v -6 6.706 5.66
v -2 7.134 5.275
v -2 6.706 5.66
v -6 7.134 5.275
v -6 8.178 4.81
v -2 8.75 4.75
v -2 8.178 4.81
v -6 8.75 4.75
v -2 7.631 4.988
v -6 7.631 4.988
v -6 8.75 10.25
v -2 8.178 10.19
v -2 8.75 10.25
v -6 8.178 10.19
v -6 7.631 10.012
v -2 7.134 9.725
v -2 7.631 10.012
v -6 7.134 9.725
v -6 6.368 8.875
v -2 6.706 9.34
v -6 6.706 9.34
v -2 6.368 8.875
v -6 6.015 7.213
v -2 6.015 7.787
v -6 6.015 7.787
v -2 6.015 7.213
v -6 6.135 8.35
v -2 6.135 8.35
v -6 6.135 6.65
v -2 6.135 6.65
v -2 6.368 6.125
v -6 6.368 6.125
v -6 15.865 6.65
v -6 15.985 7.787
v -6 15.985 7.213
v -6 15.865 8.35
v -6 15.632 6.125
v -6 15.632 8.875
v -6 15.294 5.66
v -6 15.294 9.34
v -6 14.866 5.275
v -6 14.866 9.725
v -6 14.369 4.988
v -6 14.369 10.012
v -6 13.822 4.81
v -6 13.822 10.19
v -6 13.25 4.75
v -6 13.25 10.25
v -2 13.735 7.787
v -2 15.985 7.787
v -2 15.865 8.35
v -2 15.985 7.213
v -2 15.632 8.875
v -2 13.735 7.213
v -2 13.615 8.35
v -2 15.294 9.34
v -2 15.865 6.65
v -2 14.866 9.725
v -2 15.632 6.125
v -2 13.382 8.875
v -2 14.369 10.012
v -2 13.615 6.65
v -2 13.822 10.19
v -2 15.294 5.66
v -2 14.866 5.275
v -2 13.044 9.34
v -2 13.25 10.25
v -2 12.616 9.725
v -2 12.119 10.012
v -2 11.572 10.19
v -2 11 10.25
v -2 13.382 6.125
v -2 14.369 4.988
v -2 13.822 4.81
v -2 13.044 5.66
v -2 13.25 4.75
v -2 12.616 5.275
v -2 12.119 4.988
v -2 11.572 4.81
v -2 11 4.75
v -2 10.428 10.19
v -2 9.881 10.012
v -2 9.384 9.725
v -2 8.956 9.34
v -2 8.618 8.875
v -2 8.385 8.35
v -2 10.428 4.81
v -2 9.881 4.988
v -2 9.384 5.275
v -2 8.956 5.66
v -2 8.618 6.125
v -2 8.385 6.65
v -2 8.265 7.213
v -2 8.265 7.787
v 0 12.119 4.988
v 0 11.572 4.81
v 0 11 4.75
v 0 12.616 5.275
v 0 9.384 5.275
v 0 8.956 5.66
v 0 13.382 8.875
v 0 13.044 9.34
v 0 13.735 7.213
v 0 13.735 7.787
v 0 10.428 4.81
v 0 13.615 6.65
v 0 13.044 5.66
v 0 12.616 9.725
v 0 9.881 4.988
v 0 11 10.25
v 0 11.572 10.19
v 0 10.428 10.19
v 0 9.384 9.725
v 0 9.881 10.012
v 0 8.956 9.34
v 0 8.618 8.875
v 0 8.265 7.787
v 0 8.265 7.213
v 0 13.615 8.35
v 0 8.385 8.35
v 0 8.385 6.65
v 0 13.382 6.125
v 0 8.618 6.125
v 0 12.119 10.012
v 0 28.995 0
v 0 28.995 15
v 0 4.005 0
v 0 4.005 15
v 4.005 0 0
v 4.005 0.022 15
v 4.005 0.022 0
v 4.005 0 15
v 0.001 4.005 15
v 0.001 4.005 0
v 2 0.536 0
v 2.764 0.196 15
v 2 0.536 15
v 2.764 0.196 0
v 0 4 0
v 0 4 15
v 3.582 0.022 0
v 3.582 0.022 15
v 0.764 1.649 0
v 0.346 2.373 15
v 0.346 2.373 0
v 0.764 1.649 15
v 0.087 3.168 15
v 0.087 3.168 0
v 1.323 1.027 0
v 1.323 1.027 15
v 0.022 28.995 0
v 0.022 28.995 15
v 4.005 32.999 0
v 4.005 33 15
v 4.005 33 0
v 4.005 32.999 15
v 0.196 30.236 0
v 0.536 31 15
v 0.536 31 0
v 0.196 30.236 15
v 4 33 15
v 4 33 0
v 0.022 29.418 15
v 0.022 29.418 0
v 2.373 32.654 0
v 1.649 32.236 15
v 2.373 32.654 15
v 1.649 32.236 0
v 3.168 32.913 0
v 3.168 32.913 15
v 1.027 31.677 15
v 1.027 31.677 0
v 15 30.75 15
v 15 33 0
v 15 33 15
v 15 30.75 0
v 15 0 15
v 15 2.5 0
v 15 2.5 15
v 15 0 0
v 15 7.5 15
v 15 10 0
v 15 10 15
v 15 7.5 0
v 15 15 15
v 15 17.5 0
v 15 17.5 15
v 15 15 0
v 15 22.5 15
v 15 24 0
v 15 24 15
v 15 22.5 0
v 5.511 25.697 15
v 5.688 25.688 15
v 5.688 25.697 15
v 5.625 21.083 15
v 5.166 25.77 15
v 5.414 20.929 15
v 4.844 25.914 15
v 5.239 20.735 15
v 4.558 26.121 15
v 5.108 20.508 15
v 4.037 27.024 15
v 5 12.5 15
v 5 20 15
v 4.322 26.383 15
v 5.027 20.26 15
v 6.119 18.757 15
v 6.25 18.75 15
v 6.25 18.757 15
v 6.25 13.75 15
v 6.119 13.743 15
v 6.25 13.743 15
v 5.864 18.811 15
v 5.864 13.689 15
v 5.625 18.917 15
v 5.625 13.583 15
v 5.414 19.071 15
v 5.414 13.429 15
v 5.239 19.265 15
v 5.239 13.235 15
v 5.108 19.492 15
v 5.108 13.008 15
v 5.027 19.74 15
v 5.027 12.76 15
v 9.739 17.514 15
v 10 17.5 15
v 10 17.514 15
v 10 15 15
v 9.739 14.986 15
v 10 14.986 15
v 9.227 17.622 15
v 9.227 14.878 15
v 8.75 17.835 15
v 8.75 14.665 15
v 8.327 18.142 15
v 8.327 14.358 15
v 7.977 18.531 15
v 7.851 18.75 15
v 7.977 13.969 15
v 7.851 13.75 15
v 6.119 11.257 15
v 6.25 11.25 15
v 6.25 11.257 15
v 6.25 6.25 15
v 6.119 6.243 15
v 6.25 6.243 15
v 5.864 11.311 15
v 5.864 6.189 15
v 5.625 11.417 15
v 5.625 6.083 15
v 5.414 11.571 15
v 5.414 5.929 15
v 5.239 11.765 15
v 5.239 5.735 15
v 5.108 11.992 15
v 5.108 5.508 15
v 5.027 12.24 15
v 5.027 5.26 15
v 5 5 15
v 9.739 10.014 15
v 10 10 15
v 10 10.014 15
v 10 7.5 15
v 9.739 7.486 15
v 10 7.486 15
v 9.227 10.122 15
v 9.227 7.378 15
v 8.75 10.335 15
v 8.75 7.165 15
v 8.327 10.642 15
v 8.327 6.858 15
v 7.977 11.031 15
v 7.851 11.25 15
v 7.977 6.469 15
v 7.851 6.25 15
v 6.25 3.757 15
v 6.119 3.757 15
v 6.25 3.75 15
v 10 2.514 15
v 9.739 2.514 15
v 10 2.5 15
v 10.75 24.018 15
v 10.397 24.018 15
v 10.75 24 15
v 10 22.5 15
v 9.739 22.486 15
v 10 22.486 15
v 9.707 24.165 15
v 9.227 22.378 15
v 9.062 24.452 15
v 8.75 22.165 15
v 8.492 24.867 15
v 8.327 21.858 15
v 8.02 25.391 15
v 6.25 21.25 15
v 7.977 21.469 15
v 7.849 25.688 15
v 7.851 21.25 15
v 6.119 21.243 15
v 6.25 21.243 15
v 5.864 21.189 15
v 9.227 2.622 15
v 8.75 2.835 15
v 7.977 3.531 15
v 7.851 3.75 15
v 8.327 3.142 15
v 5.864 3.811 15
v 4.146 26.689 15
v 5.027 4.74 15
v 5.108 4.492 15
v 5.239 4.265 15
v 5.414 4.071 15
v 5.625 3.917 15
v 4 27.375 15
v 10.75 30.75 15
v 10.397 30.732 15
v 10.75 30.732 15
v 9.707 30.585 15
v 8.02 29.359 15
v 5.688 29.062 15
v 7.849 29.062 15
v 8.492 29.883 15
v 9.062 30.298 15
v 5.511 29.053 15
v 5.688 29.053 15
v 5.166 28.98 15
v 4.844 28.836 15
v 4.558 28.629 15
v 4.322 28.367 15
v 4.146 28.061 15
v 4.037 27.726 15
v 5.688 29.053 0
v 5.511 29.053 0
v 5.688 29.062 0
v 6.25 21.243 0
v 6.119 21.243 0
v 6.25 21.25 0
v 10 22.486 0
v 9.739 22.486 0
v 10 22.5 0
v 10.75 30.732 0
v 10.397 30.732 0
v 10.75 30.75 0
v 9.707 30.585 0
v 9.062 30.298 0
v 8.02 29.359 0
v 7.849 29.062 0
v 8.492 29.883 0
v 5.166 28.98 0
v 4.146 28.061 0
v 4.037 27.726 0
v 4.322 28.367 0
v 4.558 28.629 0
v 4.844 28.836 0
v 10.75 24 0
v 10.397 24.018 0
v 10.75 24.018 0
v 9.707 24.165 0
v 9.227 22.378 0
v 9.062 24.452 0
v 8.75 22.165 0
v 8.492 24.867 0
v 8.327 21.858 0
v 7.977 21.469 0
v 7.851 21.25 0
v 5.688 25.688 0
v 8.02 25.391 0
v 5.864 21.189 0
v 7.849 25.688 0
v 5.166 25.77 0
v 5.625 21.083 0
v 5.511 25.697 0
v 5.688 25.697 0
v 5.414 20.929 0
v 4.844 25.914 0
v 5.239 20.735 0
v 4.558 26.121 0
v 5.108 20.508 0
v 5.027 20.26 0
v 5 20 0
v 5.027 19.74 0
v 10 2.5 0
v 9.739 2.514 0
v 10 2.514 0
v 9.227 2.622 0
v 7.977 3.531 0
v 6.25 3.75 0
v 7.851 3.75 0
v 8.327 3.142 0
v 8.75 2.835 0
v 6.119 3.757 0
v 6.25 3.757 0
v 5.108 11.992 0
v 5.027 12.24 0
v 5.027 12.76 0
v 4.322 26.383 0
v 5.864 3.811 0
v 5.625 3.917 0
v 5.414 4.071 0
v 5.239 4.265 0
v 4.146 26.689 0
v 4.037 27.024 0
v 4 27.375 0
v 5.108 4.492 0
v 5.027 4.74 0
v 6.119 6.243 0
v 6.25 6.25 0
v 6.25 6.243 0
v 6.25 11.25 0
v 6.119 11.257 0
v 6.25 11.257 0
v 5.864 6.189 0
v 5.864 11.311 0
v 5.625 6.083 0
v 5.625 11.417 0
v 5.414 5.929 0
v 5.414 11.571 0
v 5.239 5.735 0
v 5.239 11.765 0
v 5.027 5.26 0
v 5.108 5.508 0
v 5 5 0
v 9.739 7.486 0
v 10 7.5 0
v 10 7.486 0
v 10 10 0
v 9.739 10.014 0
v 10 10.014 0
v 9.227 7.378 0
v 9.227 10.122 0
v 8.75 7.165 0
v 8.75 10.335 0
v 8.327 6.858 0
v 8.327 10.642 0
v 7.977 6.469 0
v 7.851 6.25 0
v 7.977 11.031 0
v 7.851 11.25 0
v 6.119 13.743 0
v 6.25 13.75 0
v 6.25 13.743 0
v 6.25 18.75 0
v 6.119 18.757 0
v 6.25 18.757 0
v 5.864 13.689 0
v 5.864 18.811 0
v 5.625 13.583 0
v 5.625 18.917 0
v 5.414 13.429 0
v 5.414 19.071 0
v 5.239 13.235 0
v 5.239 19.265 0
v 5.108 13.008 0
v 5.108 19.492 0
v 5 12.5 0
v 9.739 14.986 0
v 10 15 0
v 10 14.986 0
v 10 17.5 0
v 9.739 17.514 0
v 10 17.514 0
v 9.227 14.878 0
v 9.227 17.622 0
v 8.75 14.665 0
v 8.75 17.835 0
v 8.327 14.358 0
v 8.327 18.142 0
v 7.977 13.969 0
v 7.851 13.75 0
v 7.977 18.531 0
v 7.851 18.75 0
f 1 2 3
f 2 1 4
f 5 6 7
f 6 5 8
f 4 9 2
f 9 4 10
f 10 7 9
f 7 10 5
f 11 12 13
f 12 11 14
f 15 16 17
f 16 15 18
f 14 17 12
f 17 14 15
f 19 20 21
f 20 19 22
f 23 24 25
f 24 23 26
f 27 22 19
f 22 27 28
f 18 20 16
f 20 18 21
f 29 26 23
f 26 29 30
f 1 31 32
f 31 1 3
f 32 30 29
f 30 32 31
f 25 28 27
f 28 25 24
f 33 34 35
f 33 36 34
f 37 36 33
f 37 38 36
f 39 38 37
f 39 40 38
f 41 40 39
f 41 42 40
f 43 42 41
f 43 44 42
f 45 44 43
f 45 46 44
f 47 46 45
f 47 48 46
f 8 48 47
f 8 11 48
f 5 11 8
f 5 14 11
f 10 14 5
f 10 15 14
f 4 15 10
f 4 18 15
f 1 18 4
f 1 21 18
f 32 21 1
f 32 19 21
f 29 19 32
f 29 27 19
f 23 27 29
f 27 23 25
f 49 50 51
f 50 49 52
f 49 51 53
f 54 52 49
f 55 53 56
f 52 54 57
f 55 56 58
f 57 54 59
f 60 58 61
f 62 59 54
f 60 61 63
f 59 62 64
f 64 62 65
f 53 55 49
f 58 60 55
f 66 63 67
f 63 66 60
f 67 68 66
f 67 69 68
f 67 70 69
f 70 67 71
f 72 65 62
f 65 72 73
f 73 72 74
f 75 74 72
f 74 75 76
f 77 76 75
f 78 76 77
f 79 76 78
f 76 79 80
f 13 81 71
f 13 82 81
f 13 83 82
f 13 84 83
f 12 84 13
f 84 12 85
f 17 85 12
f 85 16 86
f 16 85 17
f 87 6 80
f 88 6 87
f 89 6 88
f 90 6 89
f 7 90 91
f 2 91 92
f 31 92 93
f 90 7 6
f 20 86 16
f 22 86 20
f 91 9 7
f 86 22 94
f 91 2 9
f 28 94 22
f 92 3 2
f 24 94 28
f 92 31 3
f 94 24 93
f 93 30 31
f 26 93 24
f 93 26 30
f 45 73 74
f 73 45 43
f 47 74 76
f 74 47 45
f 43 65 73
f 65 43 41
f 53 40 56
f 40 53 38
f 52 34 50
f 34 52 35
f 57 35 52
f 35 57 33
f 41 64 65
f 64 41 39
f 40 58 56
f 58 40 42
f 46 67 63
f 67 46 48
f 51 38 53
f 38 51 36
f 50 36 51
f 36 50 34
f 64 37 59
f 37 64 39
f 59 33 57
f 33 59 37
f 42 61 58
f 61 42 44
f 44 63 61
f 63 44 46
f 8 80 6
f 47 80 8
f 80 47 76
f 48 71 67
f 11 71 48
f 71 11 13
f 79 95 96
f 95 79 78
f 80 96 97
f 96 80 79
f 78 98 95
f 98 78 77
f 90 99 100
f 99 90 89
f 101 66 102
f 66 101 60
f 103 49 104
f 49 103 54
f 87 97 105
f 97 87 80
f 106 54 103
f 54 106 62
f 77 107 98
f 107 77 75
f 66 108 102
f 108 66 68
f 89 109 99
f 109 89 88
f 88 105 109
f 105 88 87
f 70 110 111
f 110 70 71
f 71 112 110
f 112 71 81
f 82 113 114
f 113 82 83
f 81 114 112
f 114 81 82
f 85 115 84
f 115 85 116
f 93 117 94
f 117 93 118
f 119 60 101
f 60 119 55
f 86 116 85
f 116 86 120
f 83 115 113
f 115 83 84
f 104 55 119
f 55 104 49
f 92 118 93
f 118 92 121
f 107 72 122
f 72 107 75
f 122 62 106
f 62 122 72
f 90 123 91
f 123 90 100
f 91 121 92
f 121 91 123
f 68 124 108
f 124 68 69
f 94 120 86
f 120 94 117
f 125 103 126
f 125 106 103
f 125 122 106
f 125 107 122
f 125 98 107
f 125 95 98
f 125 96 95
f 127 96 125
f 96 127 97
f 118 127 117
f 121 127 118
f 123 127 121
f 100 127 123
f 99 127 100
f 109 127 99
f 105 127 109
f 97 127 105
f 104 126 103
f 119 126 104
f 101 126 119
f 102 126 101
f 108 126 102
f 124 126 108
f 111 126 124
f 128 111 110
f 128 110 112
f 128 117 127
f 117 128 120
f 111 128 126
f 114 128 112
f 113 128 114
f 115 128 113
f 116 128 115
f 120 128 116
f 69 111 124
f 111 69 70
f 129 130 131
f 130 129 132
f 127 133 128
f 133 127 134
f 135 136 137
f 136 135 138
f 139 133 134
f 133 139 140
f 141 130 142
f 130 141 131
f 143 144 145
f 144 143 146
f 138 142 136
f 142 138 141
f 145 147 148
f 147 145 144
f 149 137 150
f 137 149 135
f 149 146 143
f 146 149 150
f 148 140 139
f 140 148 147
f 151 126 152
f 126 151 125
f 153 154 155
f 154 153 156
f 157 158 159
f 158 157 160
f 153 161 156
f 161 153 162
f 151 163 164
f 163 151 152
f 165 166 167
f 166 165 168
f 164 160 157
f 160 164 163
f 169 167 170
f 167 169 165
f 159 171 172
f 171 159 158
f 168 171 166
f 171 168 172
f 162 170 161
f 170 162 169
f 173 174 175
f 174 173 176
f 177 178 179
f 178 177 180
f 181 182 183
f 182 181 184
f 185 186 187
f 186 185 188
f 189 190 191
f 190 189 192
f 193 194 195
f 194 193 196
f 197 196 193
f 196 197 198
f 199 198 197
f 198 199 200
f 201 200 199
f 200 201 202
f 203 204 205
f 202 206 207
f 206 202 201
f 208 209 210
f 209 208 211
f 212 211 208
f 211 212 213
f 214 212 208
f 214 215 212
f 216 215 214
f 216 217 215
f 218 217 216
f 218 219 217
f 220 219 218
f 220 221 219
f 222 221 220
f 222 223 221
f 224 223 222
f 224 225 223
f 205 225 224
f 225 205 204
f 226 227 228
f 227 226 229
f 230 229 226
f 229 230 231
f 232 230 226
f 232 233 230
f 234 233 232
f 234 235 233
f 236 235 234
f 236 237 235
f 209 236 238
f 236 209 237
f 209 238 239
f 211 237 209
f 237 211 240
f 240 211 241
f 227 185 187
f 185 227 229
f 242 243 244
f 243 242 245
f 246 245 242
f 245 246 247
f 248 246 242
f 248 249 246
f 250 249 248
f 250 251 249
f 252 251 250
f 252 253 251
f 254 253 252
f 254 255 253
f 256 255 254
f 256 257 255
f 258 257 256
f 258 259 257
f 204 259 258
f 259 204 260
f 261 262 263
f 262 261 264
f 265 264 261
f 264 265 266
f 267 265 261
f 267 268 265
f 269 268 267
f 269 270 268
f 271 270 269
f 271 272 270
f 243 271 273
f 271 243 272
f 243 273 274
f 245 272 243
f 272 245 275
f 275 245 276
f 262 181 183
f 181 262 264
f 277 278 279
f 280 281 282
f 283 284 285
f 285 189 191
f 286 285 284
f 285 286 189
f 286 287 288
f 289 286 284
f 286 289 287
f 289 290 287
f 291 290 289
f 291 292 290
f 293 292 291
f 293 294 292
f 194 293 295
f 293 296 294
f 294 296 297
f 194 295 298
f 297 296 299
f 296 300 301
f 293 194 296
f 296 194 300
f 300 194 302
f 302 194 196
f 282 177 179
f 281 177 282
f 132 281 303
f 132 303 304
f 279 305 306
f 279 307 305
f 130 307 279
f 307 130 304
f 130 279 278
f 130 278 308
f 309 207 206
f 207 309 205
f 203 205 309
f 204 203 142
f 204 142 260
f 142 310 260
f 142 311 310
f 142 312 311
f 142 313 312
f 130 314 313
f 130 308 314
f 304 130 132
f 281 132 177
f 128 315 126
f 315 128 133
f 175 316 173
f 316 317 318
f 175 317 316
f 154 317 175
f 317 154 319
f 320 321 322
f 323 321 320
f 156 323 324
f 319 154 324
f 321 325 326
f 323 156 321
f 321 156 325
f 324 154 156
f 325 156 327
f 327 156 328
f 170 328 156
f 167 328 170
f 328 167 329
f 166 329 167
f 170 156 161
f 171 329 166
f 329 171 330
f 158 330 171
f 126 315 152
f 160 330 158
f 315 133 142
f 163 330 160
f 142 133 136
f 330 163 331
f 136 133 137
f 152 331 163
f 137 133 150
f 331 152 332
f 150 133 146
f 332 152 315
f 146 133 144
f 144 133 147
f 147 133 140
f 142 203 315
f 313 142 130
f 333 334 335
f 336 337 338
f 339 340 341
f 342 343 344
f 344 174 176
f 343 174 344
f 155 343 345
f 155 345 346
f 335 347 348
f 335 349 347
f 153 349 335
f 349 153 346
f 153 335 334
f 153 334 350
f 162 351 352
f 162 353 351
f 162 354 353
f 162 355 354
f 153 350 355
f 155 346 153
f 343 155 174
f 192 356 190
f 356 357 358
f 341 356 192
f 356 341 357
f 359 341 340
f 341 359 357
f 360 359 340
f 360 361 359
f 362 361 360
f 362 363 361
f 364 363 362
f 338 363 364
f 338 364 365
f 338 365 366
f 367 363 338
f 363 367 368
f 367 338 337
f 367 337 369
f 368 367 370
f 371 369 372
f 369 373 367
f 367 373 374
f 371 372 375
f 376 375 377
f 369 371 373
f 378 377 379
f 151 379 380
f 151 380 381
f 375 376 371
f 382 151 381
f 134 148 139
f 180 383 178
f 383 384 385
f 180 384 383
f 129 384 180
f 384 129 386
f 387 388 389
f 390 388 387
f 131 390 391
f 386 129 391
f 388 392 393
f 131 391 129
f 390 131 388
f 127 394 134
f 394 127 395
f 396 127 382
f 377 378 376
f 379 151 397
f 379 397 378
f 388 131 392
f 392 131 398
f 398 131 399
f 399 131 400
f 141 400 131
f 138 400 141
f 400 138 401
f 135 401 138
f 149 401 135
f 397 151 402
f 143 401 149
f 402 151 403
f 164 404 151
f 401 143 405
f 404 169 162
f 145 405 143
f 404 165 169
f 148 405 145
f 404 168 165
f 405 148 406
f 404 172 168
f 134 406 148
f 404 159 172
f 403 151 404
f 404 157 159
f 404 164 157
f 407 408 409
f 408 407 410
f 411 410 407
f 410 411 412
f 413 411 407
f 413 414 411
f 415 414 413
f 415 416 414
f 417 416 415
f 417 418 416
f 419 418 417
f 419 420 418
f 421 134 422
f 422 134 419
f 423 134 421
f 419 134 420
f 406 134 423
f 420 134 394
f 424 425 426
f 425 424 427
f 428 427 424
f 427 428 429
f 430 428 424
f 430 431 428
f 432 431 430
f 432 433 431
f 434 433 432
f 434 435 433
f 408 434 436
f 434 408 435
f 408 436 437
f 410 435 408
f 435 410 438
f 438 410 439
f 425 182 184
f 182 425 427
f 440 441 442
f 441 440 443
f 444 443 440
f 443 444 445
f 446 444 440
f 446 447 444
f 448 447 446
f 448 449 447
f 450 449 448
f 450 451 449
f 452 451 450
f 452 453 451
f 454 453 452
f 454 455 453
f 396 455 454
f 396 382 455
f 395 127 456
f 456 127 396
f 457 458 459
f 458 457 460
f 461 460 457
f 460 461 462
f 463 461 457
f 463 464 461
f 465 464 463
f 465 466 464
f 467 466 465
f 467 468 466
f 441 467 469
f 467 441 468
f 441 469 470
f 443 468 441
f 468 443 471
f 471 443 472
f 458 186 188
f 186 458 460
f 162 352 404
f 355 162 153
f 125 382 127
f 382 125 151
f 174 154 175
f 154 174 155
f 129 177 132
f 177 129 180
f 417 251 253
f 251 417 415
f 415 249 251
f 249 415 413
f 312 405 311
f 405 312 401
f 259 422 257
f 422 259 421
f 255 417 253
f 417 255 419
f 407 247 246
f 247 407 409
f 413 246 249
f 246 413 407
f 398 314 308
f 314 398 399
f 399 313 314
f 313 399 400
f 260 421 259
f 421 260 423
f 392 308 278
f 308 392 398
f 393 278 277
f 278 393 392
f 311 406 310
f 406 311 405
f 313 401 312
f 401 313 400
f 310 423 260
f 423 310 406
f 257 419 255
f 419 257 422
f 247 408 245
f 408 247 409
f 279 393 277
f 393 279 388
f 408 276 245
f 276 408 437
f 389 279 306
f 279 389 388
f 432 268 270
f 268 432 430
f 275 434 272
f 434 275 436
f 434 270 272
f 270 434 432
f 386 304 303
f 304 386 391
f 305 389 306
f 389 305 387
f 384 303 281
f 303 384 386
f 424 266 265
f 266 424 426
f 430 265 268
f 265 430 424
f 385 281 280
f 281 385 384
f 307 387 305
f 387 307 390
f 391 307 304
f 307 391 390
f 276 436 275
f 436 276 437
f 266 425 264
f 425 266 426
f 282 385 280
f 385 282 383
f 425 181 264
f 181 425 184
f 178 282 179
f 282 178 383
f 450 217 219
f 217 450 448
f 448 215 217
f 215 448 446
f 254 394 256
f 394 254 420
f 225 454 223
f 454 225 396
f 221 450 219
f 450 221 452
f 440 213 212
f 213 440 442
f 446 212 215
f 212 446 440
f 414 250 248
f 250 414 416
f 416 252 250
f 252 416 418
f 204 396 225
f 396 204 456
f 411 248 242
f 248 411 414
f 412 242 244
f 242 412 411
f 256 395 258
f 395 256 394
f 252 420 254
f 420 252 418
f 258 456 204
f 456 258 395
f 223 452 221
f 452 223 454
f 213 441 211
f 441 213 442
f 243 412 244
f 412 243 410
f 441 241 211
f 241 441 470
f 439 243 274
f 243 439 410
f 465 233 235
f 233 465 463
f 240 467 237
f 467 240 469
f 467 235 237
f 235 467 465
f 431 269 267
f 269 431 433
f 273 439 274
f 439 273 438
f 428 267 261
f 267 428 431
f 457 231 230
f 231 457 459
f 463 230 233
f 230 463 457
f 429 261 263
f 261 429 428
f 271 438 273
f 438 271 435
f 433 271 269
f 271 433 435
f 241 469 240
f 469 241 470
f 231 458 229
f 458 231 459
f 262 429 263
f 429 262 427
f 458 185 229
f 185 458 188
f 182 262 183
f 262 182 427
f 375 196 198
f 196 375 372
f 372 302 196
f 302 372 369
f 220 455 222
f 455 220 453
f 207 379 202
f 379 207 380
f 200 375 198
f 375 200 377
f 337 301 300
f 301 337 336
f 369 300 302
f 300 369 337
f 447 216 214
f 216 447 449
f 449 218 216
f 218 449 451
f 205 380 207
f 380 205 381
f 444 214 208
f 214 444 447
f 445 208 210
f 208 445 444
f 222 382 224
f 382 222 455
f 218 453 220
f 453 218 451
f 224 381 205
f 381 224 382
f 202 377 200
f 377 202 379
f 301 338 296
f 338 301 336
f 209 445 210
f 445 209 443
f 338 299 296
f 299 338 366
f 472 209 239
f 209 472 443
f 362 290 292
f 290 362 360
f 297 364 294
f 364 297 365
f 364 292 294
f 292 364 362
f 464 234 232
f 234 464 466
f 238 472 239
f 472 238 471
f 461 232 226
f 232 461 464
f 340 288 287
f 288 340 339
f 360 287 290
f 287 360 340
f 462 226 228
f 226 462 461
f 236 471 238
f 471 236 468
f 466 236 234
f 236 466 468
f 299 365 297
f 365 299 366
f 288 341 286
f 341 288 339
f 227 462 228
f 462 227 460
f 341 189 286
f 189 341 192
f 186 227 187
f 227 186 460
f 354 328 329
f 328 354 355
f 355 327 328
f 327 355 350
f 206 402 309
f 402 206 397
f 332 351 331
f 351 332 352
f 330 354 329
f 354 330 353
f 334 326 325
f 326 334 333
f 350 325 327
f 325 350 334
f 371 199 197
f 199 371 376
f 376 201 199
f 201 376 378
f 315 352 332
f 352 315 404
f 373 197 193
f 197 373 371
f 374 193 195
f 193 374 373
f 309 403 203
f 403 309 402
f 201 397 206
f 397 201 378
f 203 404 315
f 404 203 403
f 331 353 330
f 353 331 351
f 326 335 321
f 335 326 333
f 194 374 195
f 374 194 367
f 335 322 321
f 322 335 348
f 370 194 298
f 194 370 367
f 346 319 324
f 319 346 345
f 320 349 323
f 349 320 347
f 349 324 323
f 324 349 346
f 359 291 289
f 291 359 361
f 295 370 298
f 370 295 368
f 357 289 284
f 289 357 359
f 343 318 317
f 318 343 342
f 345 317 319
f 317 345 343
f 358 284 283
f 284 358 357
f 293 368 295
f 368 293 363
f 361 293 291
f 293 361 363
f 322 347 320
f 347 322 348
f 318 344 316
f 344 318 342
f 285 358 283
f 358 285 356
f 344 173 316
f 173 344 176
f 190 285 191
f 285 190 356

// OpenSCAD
$fn = 30;

// From: http://forum.openscad.org/rounded-corners-td3843.html
module fillet(r, h) {
  translate([r / 2, r / 2, 0])
  difference() {
    cube([r + 0.01, r + 0.01, h], center = true);
    translate([r/2, r/2, 0])
    cylinder(r = r, h = h + 1, center = true);
  }
}

// The outermost shape
module bracket() {
  difference() {
    cube([15, 33, 15]);

    union() {
      translate([0, 0, 8])
        fillet(4, 17);
      translate([0, 33, 8])
      rotate([0, 0, -90])
        fillet(4, 17);
    }
  }
}

// A single channel in the bracket for one brake line
module brakeline() {
  translate([5, 2.5, 0])
  union() {
    translate([-(1.25 + 2.5), 0, 0])
      cylinder(r = 1.25, h = 15);

    translate([(-2.5 - 1.25), (-2.5/2), 0])
      cube([2.5, 2.5, 15]);

    // Brake lines are 4.75mm (cut 5mm)
    cylinder(r = 2.5, h = 15);

    translate([0, -2.5, 0])
      cube([6, 5, 15]);
  }
}

// The four channels in the bracket
module channels() {
  for (i = [0:3]) {
    offset = i * (2.5 + 5) + 2.5;

    // The three lower channels are brake lines.
    // The fourth channel is a vacuum line and it is wider.
    if (i < 3) {
      translate([0, offset, 0])
        brakeline();
    } else {
      // 1.35 * 5mm channel = 6.75. Vacuum line is 6.5mm.
      translate([-1, offset - 1, 0]) scale([1.35, 1.35, 1])
        brakeline();
    }
  }
}

module tab() {
  // The back support. The mounting hole is a rounded
  // rectangle 10mm x 5.5mm.
  translate([2.75, 2.75, 0])
    cylinder(r = 2.75, h = 4);

  translate([2.75, (10 - 2.75), 0])
    cylinder(r = 2.75, h = 4);

  translate([0, 2.75, 0])
    cube([5.5, (10 - 5.5), 4]);

  // Back support to pass through the wall
  translate([2.75, (10 - 5.5) + 0.5, 4])
    cylinder(r=2.75, h=2);
}

translate([-6, 6, (15 + 5.5) / 2]) rotate([0, 90, 0])
  tab();

difference() {
  bracket();

  translate([5, 0, -0.1]) scale([1, 1, 1.1])
    channels();
}
